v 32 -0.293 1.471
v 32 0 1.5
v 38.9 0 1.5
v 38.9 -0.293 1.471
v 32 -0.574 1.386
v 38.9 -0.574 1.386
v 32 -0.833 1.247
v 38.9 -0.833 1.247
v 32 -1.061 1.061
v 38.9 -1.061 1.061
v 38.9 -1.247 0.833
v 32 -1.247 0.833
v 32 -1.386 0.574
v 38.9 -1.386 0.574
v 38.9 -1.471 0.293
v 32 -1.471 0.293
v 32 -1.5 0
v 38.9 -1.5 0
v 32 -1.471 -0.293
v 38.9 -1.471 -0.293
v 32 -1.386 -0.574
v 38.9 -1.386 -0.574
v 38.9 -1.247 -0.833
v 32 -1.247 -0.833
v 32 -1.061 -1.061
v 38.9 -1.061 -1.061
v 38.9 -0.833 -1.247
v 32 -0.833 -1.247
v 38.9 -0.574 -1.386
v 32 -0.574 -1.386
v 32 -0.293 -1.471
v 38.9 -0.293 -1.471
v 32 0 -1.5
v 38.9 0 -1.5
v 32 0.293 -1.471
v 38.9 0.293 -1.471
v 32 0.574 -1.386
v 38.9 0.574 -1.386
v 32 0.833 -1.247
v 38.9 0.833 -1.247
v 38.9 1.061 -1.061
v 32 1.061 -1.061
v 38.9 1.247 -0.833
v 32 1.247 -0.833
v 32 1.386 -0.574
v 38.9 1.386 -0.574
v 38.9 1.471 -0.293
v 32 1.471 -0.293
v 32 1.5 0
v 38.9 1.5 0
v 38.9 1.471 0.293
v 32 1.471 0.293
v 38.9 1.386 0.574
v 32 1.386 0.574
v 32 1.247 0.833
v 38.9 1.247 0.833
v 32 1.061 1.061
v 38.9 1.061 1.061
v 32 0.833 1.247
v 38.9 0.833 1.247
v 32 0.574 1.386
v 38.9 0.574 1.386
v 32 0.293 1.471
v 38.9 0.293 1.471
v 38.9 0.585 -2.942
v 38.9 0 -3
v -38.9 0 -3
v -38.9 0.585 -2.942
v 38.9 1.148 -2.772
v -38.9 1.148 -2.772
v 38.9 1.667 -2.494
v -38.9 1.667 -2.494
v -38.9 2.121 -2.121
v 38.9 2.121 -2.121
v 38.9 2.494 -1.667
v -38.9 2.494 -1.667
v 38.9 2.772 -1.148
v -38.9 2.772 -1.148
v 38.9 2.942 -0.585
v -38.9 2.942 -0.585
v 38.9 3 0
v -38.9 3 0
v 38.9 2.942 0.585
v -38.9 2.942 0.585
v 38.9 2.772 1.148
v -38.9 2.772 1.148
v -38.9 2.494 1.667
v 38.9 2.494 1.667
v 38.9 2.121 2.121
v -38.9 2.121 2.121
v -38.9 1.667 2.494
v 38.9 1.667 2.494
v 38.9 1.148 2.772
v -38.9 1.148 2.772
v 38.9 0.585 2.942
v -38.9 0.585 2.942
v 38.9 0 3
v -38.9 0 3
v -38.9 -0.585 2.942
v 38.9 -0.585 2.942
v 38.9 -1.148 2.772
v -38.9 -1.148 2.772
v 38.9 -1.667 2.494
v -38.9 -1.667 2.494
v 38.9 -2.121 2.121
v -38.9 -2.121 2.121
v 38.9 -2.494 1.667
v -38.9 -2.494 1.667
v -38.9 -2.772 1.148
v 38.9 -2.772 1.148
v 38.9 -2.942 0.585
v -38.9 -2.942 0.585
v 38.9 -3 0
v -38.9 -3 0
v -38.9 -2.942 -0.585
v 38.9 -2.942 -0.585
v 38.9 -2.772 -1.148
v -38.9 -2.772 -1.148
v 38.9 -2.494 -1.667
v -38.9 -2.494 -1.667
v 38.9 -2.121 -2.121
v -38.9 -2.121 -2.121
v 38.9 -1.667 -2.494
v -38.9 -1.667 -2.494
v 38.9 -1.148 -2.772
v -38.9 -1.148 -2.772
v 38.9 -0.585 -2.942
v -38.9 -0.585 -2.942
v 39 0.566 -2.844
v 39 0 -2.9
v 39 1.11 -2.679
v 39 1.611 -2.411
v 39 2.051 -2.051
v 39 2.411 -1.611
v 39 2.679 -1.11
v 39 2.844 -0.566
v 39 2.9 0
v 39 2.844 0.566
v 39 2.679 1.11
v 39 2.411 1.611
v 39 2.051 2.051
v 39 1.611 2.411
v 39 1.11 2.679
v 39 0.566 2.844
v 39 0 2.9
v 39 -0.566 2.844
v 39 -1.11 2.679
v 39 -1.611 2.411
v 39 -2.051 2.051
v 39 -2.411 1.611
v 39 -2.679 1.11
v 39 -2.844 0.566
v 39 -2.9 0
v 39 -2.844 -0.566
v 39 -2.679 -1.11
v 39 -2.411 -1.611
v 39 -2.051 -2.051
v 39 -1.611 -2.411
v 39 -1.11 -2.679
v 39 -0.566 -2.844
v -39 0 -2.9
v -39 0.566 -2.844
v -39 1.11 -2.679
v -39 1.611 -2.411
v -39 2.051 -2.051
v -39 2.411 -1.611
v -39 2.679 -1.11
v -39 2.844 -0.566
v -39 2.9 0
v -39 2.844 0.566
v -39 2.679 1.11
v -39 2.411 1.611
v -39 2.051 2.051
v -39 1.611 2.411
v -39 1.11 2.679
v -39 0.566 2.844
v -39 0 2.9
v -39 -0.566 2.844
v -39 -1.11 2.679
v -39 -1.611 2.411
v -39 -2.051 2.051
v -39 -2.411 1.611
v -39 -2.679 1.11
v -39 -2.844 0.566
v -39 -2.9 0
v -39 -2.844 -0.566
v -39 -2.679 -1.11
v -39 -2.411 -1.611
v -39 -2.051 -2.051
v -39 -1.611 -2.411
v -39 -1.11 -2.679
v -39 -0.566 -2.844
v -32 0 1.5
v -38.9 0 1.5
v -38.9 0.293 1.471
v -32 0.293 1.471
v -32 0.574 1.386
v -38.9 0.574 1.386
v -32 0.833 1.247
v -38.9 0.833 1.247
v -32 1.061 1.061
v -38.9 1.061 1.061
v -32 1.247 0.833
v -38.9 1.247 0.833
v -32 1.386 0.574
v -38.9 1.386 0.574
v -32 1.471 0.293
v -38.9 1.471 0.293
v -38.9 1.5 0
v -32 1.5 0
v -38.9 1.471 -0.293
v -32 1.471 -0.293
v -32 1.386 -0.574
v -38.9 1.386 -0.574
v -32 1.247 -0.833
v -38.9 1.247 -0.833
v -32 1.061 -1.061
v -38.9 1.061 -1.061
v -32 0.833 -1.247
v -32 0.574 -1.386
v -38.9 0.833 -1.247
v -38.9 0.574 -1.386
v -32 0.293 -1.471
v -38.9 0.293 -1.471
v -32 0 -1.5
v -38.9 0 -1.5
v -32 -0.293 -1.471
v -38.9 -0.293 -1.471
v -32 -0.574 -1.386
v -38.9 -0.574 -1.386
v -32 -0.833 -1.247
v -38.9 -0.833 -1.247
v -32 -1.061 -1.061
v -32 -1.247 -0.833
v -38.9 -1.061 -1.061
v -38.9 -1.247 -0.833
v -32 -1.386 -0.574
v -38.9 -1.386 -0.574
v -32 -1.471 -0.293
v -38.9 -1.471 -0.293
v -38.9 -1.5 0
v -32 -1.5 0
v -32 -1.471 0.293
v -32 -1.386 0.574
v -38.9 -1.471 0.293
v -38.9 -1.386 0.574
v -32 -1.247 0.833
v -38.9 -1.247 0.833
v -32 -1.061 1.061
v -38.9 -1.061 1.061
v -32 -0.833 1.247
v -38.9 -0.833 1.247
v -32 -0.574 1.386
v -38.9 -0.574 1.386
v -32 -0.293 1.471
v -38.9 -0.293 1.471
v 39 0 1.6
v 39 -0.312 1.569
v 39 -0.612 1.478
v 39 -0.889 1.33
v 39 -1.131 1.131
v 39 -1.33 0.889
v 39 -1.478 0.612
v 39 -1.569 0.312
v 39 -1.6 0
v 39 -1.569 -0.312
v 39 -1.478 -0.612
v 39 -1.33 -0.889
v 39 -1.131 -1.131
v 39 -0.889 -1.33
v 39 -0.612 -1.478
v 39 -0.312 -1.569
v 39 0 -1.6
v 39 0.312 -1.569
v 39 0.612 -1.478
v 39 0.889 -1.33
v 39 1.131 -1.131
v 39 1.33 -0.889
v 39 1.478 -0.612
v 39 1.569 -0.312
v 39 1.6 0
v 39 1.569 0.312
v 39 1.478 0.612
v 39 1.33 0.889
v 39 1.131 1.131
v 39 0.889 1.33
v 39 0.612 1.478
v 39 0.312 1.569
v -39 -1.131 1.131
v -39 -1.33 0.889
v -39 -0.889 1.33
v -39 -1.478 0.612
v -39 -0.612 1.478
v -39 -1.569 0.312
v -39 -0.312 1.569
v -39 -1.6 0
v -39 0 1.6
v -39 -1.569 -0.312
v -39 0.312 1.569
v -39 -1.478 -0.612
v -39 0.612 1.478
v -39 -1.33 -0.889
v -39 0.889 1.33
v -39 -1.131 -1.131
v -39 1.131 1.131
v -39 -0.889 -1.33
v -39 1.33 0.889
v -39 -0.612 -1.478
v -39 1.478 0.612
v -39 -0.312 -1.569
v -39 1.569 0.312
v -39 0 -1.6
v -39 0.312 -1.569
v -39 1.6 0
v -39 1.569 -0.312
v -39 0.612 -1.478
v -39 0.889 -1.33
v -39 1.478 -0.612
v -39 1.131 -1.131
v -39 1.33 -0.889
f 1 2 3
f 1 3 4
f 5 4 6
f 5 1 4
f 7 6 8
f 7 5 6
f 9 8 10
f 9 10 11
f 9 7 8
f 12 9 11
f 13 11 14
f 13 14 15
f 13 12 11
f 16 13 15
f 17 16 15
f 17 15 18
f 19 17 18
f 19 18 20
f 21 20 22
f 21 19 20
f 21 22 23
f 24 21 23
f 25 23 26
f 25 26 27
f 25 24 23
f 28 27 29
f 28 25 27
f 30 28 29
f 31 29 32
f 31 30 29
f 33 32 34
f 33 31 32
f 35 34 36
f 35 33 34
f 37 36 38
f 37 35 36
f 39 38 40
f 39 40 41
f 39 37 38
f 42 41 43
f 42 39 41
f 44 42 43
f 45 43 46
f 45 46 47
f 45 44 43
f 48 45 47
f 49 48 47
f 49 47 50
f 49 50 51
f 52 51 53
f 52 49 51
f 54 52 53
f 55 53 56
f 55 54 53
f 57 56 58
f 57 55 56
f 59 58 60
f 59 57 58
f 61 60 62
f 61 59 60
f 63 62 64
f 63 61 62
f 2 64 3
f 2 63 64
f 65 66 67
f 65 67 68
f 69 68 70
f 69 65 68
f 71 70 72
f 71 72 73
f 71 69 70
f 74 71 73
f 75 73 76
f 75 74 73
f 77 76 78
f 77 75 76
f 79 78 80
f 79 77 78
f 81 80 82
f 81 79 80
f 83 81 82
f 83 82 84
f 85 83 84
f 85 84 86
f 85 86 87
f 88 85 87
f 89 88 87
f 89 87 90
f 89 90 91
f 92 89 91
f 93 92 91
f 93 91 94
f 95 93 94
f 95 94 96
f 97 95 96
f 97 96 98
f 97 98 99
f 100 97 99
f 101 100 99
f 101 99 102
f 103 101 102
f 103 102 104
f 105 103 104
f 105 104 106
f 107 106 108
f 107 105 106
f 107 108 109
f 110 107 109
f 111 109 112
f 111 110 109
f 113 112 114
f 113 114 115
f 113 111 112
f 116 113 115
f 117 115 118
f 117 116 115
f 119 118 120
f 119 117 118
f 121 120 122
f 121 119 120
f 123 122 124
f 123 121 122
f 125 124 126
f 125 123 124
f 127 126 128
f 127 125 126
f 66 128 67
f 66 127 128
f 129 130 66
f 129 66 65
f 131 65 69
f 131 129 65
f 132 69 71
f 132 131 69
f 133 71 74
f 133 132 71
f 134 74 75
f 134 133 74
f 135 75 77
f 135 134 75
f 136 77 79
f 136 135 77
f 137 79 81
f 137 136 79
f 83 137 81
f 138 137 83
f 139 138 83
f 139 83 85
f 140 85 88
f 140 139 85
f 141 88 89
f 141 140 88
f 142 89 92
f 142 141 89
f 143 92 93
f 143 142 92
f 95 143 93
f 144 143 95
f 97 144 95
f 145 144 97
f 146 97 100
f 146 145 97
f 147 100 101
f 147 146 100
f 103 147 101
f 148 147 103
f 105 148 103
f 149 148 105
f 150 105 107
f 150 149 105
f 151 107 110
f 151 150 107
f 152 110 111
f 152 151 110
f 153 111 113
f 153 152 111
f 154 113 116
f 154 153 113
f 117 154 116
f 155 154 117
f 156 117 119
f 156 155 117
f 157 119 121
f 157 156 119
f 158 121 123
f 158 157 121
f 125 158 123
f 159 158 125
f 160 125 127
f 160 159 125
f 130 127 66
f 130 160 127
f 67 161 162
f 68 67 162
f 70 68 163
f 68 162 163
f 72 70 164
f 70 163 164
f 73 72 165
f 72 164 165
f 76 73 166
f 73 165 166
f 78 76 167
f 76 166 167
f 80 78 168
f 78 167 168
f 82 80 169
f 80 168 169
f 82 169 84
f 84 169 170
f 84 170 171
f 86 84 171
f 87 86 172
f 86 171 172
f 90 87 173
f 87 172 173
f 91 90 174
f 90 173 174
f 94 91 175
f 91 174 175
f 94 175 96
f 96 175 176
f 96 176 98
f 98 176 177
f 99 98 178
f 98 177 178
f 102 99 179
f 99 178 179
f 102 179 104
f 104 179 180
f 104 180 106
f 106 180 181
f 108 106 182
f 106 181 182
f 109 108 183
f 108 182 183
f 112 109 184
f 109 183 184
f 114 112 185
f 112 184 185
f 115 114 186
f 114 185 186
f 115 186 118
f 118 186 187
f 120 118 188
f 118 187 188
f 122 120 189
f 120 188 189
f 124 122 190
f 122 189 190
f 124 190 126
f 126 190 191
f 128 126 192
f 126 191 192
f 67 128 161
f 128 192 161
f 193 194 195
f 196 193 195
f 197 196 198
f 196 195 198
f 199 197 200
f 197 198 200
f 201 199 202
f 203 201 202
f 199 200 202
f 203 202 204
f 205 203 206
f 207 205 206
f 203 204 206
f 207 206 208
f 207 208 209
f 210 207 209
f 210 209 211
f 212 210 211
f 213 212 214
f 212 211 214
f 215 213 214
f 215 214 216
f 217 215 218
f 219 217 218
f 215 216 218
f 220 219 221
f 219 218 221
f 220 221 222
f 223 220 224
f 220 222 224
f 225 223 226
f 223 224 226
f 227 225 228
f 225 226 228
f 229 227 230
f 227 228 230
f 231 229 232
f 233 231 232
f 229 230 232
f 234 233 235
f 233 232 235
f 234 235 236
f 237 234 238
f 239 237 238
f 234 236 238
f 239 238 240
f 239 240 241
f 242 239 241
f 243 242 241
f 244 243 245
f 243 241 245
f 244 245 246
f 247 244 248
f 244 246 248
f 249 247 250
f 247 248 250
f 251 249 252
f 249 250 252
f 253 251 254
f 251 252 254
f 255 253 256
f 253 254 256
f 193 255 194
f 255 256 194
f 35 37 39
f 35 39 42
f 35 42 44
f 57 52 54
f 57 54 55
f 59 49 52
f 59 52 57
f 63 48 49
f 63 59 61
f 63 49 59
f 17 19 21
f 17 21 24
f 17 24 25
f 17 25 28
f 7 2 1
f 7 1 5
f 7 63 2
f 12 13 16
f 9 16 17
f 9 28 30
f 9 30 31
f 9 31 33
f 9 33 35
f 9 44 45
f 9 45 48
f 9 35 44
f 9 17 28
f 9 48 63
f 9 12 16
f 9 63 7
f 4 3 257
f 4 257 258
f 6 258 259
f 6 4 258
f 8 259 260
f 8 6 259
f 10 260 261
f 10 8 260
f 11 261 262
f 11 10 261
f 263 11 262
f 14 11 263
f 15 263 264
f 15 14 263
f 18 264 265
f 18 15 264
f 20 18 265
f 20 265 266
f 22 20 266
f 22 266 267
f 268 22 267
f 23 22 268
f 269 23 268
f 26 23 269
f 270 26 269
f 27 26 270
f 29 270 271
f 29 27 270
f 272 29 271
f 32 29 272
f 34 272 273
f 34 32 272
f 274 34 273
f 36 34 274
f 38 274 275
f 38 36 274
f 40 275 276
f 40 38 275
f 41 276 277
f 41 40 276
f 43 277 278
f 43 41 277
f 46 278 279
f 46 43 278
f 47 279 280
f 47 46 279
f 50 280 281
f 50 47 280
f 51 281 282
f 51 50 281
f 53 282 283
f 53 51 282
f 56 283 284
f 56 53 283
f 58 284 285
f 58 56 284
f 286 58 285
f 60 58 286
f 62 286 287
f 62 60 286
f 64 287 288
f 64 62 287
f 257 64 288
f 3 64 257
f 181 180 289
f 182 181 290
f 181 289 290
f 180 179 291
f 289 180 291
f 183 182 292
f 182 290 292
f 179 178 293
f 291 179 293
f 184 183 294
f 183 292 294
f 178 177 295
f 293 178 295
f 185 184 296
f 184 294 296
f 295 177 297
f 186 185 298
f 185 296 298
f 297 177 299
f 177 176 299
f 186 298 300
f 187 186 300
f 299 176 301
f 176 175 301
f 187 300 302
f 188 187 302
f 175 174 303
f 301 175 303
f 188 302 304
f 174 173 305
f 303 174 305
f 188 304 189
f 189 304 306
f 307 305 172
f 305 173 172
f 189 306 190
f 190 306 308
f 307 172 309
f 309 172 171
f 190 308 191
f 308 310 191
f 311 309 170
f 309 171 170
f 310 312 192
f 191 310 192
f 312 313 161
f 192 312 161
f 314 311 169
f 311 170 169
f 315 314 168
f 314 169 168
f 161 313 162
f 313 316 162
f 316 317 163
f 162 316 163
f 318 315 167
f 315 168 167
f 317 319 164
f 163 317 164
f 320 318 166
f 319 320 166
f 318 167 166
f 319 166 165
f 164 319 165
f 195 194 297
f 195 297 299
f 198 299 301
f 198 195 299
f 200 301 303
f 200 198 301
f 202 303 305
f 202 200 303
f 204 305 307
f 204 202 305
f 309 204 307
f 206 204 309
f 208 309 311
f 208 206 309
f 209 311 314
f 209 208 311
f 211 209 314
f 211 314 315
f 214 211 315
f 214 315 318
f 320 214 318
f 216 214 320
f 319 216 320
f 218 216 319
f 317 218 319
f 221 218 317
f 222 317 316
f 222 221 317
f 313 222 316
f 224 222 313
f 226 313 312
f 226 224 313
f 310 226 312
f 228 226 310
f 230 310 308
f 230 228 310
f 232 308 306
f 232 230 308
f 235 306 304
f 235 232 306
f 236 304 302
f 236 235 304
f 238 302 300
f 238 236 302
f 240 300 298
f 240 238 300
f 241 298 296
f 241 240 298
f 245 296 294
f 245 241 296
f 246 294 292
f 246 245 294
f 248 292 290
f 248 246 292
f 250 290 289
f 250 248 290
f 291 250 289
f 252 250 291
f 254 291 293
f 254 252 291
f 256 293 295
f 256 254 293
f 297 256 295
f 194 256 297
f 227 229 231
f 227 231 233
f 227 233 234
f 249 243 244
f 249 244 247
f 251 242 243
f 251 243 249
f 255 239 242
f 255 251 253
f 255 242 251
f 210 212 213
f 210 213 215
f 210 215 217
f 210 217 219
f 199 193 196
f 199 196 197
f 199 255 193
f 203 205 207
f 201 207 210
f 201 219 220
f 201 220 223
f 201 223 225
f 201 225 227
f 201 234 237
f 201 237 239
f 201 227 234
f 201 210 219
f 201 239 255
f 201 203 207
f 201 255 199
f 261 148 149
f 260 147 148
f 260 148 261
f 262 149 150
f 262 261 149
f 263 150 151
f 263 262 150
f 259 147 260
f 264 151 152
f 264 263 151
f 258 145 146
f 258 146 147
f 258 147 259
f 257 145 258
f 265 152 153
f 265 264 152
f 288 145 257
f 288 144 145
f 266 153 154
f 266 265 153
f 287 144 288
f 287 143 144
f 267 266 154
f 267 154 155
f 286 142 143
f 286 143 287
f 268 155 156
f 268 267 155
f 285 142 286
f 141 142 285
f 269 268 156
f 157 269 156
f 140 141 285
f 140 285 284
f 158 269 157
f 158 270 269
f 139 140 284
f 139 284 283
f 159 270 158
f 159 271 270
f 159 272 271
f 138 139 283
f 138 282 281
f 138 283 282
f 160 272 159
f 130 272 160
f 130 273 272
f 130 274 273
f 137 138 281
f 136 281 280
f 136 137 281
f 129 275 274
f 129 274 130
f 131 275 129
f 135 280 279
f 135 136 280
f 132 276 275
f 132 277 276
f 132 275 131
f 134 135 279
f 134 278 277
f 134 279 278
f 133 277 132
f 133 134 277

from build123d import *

# Parameters (mm, degrees)
SKETCH1_R           = 3
BOSS_EXTRUDE1_DEPTH = 39
SKETCH2_R           = 1.5
CUT_EXTRUDE1_DEPTH  = 7
CUT_EXTRUDE2_START  = -7
SKETCH3_R           = 1.5
CUT_EXTRUDE2_DEPTH  = 7
CHAMFER1_SIZE       = 0.1


with BuildPart() as part:
    # Sketch1 → Boss-Extrude1 (new, symmetric)
    with BuildSketch(Plane(origin=(0, 0, 0), x_dir=(0, 0, -1), z_dir=(1, 0, 0))):
        Circle(SKETCH1_R)
    extrude(amount=BOSS_EXTRUDE1_DEPTH, both=True)

    # Sketch2 → Cut-Extrude1 (cut)
    with BuildSketch(Plane.ZY.offset(39)):
        Circle(SKETCH2_R)
    extrude(amount=-CUT_EXTRUDE1_DEPTH, mode=Mode.SUBTRACT)

    # Sketch3 → Cut-Extrude2 (cut)
    with BuildSketch(Plane(origin=(39, 0, 0), x_dir=(0, 0, -1), z_dir=(1, 0, 0)).offset(CUT_EXTRUDE2_START)):
        with Locations(Location((0, 0, 0), (0, 0, 180))):
            Circle(SKETCH3_R)
    extrude(amount=CUT_EXTRUDE2_DEPTH, mode=Mode.SUBTRACT)

    # Chamfer1
    chamfer1_edges = [part.edges().sort_by_distance(p)[0] for p in [
        (39, 0, -1.5),
        (-39, 0, 3),
        (39, 0, 3),
        (-39, 0, -1.5),
    ]]
    chamfer(chamfer1_edges, length=CHAMFER1_SIZE)


solid = part.part
